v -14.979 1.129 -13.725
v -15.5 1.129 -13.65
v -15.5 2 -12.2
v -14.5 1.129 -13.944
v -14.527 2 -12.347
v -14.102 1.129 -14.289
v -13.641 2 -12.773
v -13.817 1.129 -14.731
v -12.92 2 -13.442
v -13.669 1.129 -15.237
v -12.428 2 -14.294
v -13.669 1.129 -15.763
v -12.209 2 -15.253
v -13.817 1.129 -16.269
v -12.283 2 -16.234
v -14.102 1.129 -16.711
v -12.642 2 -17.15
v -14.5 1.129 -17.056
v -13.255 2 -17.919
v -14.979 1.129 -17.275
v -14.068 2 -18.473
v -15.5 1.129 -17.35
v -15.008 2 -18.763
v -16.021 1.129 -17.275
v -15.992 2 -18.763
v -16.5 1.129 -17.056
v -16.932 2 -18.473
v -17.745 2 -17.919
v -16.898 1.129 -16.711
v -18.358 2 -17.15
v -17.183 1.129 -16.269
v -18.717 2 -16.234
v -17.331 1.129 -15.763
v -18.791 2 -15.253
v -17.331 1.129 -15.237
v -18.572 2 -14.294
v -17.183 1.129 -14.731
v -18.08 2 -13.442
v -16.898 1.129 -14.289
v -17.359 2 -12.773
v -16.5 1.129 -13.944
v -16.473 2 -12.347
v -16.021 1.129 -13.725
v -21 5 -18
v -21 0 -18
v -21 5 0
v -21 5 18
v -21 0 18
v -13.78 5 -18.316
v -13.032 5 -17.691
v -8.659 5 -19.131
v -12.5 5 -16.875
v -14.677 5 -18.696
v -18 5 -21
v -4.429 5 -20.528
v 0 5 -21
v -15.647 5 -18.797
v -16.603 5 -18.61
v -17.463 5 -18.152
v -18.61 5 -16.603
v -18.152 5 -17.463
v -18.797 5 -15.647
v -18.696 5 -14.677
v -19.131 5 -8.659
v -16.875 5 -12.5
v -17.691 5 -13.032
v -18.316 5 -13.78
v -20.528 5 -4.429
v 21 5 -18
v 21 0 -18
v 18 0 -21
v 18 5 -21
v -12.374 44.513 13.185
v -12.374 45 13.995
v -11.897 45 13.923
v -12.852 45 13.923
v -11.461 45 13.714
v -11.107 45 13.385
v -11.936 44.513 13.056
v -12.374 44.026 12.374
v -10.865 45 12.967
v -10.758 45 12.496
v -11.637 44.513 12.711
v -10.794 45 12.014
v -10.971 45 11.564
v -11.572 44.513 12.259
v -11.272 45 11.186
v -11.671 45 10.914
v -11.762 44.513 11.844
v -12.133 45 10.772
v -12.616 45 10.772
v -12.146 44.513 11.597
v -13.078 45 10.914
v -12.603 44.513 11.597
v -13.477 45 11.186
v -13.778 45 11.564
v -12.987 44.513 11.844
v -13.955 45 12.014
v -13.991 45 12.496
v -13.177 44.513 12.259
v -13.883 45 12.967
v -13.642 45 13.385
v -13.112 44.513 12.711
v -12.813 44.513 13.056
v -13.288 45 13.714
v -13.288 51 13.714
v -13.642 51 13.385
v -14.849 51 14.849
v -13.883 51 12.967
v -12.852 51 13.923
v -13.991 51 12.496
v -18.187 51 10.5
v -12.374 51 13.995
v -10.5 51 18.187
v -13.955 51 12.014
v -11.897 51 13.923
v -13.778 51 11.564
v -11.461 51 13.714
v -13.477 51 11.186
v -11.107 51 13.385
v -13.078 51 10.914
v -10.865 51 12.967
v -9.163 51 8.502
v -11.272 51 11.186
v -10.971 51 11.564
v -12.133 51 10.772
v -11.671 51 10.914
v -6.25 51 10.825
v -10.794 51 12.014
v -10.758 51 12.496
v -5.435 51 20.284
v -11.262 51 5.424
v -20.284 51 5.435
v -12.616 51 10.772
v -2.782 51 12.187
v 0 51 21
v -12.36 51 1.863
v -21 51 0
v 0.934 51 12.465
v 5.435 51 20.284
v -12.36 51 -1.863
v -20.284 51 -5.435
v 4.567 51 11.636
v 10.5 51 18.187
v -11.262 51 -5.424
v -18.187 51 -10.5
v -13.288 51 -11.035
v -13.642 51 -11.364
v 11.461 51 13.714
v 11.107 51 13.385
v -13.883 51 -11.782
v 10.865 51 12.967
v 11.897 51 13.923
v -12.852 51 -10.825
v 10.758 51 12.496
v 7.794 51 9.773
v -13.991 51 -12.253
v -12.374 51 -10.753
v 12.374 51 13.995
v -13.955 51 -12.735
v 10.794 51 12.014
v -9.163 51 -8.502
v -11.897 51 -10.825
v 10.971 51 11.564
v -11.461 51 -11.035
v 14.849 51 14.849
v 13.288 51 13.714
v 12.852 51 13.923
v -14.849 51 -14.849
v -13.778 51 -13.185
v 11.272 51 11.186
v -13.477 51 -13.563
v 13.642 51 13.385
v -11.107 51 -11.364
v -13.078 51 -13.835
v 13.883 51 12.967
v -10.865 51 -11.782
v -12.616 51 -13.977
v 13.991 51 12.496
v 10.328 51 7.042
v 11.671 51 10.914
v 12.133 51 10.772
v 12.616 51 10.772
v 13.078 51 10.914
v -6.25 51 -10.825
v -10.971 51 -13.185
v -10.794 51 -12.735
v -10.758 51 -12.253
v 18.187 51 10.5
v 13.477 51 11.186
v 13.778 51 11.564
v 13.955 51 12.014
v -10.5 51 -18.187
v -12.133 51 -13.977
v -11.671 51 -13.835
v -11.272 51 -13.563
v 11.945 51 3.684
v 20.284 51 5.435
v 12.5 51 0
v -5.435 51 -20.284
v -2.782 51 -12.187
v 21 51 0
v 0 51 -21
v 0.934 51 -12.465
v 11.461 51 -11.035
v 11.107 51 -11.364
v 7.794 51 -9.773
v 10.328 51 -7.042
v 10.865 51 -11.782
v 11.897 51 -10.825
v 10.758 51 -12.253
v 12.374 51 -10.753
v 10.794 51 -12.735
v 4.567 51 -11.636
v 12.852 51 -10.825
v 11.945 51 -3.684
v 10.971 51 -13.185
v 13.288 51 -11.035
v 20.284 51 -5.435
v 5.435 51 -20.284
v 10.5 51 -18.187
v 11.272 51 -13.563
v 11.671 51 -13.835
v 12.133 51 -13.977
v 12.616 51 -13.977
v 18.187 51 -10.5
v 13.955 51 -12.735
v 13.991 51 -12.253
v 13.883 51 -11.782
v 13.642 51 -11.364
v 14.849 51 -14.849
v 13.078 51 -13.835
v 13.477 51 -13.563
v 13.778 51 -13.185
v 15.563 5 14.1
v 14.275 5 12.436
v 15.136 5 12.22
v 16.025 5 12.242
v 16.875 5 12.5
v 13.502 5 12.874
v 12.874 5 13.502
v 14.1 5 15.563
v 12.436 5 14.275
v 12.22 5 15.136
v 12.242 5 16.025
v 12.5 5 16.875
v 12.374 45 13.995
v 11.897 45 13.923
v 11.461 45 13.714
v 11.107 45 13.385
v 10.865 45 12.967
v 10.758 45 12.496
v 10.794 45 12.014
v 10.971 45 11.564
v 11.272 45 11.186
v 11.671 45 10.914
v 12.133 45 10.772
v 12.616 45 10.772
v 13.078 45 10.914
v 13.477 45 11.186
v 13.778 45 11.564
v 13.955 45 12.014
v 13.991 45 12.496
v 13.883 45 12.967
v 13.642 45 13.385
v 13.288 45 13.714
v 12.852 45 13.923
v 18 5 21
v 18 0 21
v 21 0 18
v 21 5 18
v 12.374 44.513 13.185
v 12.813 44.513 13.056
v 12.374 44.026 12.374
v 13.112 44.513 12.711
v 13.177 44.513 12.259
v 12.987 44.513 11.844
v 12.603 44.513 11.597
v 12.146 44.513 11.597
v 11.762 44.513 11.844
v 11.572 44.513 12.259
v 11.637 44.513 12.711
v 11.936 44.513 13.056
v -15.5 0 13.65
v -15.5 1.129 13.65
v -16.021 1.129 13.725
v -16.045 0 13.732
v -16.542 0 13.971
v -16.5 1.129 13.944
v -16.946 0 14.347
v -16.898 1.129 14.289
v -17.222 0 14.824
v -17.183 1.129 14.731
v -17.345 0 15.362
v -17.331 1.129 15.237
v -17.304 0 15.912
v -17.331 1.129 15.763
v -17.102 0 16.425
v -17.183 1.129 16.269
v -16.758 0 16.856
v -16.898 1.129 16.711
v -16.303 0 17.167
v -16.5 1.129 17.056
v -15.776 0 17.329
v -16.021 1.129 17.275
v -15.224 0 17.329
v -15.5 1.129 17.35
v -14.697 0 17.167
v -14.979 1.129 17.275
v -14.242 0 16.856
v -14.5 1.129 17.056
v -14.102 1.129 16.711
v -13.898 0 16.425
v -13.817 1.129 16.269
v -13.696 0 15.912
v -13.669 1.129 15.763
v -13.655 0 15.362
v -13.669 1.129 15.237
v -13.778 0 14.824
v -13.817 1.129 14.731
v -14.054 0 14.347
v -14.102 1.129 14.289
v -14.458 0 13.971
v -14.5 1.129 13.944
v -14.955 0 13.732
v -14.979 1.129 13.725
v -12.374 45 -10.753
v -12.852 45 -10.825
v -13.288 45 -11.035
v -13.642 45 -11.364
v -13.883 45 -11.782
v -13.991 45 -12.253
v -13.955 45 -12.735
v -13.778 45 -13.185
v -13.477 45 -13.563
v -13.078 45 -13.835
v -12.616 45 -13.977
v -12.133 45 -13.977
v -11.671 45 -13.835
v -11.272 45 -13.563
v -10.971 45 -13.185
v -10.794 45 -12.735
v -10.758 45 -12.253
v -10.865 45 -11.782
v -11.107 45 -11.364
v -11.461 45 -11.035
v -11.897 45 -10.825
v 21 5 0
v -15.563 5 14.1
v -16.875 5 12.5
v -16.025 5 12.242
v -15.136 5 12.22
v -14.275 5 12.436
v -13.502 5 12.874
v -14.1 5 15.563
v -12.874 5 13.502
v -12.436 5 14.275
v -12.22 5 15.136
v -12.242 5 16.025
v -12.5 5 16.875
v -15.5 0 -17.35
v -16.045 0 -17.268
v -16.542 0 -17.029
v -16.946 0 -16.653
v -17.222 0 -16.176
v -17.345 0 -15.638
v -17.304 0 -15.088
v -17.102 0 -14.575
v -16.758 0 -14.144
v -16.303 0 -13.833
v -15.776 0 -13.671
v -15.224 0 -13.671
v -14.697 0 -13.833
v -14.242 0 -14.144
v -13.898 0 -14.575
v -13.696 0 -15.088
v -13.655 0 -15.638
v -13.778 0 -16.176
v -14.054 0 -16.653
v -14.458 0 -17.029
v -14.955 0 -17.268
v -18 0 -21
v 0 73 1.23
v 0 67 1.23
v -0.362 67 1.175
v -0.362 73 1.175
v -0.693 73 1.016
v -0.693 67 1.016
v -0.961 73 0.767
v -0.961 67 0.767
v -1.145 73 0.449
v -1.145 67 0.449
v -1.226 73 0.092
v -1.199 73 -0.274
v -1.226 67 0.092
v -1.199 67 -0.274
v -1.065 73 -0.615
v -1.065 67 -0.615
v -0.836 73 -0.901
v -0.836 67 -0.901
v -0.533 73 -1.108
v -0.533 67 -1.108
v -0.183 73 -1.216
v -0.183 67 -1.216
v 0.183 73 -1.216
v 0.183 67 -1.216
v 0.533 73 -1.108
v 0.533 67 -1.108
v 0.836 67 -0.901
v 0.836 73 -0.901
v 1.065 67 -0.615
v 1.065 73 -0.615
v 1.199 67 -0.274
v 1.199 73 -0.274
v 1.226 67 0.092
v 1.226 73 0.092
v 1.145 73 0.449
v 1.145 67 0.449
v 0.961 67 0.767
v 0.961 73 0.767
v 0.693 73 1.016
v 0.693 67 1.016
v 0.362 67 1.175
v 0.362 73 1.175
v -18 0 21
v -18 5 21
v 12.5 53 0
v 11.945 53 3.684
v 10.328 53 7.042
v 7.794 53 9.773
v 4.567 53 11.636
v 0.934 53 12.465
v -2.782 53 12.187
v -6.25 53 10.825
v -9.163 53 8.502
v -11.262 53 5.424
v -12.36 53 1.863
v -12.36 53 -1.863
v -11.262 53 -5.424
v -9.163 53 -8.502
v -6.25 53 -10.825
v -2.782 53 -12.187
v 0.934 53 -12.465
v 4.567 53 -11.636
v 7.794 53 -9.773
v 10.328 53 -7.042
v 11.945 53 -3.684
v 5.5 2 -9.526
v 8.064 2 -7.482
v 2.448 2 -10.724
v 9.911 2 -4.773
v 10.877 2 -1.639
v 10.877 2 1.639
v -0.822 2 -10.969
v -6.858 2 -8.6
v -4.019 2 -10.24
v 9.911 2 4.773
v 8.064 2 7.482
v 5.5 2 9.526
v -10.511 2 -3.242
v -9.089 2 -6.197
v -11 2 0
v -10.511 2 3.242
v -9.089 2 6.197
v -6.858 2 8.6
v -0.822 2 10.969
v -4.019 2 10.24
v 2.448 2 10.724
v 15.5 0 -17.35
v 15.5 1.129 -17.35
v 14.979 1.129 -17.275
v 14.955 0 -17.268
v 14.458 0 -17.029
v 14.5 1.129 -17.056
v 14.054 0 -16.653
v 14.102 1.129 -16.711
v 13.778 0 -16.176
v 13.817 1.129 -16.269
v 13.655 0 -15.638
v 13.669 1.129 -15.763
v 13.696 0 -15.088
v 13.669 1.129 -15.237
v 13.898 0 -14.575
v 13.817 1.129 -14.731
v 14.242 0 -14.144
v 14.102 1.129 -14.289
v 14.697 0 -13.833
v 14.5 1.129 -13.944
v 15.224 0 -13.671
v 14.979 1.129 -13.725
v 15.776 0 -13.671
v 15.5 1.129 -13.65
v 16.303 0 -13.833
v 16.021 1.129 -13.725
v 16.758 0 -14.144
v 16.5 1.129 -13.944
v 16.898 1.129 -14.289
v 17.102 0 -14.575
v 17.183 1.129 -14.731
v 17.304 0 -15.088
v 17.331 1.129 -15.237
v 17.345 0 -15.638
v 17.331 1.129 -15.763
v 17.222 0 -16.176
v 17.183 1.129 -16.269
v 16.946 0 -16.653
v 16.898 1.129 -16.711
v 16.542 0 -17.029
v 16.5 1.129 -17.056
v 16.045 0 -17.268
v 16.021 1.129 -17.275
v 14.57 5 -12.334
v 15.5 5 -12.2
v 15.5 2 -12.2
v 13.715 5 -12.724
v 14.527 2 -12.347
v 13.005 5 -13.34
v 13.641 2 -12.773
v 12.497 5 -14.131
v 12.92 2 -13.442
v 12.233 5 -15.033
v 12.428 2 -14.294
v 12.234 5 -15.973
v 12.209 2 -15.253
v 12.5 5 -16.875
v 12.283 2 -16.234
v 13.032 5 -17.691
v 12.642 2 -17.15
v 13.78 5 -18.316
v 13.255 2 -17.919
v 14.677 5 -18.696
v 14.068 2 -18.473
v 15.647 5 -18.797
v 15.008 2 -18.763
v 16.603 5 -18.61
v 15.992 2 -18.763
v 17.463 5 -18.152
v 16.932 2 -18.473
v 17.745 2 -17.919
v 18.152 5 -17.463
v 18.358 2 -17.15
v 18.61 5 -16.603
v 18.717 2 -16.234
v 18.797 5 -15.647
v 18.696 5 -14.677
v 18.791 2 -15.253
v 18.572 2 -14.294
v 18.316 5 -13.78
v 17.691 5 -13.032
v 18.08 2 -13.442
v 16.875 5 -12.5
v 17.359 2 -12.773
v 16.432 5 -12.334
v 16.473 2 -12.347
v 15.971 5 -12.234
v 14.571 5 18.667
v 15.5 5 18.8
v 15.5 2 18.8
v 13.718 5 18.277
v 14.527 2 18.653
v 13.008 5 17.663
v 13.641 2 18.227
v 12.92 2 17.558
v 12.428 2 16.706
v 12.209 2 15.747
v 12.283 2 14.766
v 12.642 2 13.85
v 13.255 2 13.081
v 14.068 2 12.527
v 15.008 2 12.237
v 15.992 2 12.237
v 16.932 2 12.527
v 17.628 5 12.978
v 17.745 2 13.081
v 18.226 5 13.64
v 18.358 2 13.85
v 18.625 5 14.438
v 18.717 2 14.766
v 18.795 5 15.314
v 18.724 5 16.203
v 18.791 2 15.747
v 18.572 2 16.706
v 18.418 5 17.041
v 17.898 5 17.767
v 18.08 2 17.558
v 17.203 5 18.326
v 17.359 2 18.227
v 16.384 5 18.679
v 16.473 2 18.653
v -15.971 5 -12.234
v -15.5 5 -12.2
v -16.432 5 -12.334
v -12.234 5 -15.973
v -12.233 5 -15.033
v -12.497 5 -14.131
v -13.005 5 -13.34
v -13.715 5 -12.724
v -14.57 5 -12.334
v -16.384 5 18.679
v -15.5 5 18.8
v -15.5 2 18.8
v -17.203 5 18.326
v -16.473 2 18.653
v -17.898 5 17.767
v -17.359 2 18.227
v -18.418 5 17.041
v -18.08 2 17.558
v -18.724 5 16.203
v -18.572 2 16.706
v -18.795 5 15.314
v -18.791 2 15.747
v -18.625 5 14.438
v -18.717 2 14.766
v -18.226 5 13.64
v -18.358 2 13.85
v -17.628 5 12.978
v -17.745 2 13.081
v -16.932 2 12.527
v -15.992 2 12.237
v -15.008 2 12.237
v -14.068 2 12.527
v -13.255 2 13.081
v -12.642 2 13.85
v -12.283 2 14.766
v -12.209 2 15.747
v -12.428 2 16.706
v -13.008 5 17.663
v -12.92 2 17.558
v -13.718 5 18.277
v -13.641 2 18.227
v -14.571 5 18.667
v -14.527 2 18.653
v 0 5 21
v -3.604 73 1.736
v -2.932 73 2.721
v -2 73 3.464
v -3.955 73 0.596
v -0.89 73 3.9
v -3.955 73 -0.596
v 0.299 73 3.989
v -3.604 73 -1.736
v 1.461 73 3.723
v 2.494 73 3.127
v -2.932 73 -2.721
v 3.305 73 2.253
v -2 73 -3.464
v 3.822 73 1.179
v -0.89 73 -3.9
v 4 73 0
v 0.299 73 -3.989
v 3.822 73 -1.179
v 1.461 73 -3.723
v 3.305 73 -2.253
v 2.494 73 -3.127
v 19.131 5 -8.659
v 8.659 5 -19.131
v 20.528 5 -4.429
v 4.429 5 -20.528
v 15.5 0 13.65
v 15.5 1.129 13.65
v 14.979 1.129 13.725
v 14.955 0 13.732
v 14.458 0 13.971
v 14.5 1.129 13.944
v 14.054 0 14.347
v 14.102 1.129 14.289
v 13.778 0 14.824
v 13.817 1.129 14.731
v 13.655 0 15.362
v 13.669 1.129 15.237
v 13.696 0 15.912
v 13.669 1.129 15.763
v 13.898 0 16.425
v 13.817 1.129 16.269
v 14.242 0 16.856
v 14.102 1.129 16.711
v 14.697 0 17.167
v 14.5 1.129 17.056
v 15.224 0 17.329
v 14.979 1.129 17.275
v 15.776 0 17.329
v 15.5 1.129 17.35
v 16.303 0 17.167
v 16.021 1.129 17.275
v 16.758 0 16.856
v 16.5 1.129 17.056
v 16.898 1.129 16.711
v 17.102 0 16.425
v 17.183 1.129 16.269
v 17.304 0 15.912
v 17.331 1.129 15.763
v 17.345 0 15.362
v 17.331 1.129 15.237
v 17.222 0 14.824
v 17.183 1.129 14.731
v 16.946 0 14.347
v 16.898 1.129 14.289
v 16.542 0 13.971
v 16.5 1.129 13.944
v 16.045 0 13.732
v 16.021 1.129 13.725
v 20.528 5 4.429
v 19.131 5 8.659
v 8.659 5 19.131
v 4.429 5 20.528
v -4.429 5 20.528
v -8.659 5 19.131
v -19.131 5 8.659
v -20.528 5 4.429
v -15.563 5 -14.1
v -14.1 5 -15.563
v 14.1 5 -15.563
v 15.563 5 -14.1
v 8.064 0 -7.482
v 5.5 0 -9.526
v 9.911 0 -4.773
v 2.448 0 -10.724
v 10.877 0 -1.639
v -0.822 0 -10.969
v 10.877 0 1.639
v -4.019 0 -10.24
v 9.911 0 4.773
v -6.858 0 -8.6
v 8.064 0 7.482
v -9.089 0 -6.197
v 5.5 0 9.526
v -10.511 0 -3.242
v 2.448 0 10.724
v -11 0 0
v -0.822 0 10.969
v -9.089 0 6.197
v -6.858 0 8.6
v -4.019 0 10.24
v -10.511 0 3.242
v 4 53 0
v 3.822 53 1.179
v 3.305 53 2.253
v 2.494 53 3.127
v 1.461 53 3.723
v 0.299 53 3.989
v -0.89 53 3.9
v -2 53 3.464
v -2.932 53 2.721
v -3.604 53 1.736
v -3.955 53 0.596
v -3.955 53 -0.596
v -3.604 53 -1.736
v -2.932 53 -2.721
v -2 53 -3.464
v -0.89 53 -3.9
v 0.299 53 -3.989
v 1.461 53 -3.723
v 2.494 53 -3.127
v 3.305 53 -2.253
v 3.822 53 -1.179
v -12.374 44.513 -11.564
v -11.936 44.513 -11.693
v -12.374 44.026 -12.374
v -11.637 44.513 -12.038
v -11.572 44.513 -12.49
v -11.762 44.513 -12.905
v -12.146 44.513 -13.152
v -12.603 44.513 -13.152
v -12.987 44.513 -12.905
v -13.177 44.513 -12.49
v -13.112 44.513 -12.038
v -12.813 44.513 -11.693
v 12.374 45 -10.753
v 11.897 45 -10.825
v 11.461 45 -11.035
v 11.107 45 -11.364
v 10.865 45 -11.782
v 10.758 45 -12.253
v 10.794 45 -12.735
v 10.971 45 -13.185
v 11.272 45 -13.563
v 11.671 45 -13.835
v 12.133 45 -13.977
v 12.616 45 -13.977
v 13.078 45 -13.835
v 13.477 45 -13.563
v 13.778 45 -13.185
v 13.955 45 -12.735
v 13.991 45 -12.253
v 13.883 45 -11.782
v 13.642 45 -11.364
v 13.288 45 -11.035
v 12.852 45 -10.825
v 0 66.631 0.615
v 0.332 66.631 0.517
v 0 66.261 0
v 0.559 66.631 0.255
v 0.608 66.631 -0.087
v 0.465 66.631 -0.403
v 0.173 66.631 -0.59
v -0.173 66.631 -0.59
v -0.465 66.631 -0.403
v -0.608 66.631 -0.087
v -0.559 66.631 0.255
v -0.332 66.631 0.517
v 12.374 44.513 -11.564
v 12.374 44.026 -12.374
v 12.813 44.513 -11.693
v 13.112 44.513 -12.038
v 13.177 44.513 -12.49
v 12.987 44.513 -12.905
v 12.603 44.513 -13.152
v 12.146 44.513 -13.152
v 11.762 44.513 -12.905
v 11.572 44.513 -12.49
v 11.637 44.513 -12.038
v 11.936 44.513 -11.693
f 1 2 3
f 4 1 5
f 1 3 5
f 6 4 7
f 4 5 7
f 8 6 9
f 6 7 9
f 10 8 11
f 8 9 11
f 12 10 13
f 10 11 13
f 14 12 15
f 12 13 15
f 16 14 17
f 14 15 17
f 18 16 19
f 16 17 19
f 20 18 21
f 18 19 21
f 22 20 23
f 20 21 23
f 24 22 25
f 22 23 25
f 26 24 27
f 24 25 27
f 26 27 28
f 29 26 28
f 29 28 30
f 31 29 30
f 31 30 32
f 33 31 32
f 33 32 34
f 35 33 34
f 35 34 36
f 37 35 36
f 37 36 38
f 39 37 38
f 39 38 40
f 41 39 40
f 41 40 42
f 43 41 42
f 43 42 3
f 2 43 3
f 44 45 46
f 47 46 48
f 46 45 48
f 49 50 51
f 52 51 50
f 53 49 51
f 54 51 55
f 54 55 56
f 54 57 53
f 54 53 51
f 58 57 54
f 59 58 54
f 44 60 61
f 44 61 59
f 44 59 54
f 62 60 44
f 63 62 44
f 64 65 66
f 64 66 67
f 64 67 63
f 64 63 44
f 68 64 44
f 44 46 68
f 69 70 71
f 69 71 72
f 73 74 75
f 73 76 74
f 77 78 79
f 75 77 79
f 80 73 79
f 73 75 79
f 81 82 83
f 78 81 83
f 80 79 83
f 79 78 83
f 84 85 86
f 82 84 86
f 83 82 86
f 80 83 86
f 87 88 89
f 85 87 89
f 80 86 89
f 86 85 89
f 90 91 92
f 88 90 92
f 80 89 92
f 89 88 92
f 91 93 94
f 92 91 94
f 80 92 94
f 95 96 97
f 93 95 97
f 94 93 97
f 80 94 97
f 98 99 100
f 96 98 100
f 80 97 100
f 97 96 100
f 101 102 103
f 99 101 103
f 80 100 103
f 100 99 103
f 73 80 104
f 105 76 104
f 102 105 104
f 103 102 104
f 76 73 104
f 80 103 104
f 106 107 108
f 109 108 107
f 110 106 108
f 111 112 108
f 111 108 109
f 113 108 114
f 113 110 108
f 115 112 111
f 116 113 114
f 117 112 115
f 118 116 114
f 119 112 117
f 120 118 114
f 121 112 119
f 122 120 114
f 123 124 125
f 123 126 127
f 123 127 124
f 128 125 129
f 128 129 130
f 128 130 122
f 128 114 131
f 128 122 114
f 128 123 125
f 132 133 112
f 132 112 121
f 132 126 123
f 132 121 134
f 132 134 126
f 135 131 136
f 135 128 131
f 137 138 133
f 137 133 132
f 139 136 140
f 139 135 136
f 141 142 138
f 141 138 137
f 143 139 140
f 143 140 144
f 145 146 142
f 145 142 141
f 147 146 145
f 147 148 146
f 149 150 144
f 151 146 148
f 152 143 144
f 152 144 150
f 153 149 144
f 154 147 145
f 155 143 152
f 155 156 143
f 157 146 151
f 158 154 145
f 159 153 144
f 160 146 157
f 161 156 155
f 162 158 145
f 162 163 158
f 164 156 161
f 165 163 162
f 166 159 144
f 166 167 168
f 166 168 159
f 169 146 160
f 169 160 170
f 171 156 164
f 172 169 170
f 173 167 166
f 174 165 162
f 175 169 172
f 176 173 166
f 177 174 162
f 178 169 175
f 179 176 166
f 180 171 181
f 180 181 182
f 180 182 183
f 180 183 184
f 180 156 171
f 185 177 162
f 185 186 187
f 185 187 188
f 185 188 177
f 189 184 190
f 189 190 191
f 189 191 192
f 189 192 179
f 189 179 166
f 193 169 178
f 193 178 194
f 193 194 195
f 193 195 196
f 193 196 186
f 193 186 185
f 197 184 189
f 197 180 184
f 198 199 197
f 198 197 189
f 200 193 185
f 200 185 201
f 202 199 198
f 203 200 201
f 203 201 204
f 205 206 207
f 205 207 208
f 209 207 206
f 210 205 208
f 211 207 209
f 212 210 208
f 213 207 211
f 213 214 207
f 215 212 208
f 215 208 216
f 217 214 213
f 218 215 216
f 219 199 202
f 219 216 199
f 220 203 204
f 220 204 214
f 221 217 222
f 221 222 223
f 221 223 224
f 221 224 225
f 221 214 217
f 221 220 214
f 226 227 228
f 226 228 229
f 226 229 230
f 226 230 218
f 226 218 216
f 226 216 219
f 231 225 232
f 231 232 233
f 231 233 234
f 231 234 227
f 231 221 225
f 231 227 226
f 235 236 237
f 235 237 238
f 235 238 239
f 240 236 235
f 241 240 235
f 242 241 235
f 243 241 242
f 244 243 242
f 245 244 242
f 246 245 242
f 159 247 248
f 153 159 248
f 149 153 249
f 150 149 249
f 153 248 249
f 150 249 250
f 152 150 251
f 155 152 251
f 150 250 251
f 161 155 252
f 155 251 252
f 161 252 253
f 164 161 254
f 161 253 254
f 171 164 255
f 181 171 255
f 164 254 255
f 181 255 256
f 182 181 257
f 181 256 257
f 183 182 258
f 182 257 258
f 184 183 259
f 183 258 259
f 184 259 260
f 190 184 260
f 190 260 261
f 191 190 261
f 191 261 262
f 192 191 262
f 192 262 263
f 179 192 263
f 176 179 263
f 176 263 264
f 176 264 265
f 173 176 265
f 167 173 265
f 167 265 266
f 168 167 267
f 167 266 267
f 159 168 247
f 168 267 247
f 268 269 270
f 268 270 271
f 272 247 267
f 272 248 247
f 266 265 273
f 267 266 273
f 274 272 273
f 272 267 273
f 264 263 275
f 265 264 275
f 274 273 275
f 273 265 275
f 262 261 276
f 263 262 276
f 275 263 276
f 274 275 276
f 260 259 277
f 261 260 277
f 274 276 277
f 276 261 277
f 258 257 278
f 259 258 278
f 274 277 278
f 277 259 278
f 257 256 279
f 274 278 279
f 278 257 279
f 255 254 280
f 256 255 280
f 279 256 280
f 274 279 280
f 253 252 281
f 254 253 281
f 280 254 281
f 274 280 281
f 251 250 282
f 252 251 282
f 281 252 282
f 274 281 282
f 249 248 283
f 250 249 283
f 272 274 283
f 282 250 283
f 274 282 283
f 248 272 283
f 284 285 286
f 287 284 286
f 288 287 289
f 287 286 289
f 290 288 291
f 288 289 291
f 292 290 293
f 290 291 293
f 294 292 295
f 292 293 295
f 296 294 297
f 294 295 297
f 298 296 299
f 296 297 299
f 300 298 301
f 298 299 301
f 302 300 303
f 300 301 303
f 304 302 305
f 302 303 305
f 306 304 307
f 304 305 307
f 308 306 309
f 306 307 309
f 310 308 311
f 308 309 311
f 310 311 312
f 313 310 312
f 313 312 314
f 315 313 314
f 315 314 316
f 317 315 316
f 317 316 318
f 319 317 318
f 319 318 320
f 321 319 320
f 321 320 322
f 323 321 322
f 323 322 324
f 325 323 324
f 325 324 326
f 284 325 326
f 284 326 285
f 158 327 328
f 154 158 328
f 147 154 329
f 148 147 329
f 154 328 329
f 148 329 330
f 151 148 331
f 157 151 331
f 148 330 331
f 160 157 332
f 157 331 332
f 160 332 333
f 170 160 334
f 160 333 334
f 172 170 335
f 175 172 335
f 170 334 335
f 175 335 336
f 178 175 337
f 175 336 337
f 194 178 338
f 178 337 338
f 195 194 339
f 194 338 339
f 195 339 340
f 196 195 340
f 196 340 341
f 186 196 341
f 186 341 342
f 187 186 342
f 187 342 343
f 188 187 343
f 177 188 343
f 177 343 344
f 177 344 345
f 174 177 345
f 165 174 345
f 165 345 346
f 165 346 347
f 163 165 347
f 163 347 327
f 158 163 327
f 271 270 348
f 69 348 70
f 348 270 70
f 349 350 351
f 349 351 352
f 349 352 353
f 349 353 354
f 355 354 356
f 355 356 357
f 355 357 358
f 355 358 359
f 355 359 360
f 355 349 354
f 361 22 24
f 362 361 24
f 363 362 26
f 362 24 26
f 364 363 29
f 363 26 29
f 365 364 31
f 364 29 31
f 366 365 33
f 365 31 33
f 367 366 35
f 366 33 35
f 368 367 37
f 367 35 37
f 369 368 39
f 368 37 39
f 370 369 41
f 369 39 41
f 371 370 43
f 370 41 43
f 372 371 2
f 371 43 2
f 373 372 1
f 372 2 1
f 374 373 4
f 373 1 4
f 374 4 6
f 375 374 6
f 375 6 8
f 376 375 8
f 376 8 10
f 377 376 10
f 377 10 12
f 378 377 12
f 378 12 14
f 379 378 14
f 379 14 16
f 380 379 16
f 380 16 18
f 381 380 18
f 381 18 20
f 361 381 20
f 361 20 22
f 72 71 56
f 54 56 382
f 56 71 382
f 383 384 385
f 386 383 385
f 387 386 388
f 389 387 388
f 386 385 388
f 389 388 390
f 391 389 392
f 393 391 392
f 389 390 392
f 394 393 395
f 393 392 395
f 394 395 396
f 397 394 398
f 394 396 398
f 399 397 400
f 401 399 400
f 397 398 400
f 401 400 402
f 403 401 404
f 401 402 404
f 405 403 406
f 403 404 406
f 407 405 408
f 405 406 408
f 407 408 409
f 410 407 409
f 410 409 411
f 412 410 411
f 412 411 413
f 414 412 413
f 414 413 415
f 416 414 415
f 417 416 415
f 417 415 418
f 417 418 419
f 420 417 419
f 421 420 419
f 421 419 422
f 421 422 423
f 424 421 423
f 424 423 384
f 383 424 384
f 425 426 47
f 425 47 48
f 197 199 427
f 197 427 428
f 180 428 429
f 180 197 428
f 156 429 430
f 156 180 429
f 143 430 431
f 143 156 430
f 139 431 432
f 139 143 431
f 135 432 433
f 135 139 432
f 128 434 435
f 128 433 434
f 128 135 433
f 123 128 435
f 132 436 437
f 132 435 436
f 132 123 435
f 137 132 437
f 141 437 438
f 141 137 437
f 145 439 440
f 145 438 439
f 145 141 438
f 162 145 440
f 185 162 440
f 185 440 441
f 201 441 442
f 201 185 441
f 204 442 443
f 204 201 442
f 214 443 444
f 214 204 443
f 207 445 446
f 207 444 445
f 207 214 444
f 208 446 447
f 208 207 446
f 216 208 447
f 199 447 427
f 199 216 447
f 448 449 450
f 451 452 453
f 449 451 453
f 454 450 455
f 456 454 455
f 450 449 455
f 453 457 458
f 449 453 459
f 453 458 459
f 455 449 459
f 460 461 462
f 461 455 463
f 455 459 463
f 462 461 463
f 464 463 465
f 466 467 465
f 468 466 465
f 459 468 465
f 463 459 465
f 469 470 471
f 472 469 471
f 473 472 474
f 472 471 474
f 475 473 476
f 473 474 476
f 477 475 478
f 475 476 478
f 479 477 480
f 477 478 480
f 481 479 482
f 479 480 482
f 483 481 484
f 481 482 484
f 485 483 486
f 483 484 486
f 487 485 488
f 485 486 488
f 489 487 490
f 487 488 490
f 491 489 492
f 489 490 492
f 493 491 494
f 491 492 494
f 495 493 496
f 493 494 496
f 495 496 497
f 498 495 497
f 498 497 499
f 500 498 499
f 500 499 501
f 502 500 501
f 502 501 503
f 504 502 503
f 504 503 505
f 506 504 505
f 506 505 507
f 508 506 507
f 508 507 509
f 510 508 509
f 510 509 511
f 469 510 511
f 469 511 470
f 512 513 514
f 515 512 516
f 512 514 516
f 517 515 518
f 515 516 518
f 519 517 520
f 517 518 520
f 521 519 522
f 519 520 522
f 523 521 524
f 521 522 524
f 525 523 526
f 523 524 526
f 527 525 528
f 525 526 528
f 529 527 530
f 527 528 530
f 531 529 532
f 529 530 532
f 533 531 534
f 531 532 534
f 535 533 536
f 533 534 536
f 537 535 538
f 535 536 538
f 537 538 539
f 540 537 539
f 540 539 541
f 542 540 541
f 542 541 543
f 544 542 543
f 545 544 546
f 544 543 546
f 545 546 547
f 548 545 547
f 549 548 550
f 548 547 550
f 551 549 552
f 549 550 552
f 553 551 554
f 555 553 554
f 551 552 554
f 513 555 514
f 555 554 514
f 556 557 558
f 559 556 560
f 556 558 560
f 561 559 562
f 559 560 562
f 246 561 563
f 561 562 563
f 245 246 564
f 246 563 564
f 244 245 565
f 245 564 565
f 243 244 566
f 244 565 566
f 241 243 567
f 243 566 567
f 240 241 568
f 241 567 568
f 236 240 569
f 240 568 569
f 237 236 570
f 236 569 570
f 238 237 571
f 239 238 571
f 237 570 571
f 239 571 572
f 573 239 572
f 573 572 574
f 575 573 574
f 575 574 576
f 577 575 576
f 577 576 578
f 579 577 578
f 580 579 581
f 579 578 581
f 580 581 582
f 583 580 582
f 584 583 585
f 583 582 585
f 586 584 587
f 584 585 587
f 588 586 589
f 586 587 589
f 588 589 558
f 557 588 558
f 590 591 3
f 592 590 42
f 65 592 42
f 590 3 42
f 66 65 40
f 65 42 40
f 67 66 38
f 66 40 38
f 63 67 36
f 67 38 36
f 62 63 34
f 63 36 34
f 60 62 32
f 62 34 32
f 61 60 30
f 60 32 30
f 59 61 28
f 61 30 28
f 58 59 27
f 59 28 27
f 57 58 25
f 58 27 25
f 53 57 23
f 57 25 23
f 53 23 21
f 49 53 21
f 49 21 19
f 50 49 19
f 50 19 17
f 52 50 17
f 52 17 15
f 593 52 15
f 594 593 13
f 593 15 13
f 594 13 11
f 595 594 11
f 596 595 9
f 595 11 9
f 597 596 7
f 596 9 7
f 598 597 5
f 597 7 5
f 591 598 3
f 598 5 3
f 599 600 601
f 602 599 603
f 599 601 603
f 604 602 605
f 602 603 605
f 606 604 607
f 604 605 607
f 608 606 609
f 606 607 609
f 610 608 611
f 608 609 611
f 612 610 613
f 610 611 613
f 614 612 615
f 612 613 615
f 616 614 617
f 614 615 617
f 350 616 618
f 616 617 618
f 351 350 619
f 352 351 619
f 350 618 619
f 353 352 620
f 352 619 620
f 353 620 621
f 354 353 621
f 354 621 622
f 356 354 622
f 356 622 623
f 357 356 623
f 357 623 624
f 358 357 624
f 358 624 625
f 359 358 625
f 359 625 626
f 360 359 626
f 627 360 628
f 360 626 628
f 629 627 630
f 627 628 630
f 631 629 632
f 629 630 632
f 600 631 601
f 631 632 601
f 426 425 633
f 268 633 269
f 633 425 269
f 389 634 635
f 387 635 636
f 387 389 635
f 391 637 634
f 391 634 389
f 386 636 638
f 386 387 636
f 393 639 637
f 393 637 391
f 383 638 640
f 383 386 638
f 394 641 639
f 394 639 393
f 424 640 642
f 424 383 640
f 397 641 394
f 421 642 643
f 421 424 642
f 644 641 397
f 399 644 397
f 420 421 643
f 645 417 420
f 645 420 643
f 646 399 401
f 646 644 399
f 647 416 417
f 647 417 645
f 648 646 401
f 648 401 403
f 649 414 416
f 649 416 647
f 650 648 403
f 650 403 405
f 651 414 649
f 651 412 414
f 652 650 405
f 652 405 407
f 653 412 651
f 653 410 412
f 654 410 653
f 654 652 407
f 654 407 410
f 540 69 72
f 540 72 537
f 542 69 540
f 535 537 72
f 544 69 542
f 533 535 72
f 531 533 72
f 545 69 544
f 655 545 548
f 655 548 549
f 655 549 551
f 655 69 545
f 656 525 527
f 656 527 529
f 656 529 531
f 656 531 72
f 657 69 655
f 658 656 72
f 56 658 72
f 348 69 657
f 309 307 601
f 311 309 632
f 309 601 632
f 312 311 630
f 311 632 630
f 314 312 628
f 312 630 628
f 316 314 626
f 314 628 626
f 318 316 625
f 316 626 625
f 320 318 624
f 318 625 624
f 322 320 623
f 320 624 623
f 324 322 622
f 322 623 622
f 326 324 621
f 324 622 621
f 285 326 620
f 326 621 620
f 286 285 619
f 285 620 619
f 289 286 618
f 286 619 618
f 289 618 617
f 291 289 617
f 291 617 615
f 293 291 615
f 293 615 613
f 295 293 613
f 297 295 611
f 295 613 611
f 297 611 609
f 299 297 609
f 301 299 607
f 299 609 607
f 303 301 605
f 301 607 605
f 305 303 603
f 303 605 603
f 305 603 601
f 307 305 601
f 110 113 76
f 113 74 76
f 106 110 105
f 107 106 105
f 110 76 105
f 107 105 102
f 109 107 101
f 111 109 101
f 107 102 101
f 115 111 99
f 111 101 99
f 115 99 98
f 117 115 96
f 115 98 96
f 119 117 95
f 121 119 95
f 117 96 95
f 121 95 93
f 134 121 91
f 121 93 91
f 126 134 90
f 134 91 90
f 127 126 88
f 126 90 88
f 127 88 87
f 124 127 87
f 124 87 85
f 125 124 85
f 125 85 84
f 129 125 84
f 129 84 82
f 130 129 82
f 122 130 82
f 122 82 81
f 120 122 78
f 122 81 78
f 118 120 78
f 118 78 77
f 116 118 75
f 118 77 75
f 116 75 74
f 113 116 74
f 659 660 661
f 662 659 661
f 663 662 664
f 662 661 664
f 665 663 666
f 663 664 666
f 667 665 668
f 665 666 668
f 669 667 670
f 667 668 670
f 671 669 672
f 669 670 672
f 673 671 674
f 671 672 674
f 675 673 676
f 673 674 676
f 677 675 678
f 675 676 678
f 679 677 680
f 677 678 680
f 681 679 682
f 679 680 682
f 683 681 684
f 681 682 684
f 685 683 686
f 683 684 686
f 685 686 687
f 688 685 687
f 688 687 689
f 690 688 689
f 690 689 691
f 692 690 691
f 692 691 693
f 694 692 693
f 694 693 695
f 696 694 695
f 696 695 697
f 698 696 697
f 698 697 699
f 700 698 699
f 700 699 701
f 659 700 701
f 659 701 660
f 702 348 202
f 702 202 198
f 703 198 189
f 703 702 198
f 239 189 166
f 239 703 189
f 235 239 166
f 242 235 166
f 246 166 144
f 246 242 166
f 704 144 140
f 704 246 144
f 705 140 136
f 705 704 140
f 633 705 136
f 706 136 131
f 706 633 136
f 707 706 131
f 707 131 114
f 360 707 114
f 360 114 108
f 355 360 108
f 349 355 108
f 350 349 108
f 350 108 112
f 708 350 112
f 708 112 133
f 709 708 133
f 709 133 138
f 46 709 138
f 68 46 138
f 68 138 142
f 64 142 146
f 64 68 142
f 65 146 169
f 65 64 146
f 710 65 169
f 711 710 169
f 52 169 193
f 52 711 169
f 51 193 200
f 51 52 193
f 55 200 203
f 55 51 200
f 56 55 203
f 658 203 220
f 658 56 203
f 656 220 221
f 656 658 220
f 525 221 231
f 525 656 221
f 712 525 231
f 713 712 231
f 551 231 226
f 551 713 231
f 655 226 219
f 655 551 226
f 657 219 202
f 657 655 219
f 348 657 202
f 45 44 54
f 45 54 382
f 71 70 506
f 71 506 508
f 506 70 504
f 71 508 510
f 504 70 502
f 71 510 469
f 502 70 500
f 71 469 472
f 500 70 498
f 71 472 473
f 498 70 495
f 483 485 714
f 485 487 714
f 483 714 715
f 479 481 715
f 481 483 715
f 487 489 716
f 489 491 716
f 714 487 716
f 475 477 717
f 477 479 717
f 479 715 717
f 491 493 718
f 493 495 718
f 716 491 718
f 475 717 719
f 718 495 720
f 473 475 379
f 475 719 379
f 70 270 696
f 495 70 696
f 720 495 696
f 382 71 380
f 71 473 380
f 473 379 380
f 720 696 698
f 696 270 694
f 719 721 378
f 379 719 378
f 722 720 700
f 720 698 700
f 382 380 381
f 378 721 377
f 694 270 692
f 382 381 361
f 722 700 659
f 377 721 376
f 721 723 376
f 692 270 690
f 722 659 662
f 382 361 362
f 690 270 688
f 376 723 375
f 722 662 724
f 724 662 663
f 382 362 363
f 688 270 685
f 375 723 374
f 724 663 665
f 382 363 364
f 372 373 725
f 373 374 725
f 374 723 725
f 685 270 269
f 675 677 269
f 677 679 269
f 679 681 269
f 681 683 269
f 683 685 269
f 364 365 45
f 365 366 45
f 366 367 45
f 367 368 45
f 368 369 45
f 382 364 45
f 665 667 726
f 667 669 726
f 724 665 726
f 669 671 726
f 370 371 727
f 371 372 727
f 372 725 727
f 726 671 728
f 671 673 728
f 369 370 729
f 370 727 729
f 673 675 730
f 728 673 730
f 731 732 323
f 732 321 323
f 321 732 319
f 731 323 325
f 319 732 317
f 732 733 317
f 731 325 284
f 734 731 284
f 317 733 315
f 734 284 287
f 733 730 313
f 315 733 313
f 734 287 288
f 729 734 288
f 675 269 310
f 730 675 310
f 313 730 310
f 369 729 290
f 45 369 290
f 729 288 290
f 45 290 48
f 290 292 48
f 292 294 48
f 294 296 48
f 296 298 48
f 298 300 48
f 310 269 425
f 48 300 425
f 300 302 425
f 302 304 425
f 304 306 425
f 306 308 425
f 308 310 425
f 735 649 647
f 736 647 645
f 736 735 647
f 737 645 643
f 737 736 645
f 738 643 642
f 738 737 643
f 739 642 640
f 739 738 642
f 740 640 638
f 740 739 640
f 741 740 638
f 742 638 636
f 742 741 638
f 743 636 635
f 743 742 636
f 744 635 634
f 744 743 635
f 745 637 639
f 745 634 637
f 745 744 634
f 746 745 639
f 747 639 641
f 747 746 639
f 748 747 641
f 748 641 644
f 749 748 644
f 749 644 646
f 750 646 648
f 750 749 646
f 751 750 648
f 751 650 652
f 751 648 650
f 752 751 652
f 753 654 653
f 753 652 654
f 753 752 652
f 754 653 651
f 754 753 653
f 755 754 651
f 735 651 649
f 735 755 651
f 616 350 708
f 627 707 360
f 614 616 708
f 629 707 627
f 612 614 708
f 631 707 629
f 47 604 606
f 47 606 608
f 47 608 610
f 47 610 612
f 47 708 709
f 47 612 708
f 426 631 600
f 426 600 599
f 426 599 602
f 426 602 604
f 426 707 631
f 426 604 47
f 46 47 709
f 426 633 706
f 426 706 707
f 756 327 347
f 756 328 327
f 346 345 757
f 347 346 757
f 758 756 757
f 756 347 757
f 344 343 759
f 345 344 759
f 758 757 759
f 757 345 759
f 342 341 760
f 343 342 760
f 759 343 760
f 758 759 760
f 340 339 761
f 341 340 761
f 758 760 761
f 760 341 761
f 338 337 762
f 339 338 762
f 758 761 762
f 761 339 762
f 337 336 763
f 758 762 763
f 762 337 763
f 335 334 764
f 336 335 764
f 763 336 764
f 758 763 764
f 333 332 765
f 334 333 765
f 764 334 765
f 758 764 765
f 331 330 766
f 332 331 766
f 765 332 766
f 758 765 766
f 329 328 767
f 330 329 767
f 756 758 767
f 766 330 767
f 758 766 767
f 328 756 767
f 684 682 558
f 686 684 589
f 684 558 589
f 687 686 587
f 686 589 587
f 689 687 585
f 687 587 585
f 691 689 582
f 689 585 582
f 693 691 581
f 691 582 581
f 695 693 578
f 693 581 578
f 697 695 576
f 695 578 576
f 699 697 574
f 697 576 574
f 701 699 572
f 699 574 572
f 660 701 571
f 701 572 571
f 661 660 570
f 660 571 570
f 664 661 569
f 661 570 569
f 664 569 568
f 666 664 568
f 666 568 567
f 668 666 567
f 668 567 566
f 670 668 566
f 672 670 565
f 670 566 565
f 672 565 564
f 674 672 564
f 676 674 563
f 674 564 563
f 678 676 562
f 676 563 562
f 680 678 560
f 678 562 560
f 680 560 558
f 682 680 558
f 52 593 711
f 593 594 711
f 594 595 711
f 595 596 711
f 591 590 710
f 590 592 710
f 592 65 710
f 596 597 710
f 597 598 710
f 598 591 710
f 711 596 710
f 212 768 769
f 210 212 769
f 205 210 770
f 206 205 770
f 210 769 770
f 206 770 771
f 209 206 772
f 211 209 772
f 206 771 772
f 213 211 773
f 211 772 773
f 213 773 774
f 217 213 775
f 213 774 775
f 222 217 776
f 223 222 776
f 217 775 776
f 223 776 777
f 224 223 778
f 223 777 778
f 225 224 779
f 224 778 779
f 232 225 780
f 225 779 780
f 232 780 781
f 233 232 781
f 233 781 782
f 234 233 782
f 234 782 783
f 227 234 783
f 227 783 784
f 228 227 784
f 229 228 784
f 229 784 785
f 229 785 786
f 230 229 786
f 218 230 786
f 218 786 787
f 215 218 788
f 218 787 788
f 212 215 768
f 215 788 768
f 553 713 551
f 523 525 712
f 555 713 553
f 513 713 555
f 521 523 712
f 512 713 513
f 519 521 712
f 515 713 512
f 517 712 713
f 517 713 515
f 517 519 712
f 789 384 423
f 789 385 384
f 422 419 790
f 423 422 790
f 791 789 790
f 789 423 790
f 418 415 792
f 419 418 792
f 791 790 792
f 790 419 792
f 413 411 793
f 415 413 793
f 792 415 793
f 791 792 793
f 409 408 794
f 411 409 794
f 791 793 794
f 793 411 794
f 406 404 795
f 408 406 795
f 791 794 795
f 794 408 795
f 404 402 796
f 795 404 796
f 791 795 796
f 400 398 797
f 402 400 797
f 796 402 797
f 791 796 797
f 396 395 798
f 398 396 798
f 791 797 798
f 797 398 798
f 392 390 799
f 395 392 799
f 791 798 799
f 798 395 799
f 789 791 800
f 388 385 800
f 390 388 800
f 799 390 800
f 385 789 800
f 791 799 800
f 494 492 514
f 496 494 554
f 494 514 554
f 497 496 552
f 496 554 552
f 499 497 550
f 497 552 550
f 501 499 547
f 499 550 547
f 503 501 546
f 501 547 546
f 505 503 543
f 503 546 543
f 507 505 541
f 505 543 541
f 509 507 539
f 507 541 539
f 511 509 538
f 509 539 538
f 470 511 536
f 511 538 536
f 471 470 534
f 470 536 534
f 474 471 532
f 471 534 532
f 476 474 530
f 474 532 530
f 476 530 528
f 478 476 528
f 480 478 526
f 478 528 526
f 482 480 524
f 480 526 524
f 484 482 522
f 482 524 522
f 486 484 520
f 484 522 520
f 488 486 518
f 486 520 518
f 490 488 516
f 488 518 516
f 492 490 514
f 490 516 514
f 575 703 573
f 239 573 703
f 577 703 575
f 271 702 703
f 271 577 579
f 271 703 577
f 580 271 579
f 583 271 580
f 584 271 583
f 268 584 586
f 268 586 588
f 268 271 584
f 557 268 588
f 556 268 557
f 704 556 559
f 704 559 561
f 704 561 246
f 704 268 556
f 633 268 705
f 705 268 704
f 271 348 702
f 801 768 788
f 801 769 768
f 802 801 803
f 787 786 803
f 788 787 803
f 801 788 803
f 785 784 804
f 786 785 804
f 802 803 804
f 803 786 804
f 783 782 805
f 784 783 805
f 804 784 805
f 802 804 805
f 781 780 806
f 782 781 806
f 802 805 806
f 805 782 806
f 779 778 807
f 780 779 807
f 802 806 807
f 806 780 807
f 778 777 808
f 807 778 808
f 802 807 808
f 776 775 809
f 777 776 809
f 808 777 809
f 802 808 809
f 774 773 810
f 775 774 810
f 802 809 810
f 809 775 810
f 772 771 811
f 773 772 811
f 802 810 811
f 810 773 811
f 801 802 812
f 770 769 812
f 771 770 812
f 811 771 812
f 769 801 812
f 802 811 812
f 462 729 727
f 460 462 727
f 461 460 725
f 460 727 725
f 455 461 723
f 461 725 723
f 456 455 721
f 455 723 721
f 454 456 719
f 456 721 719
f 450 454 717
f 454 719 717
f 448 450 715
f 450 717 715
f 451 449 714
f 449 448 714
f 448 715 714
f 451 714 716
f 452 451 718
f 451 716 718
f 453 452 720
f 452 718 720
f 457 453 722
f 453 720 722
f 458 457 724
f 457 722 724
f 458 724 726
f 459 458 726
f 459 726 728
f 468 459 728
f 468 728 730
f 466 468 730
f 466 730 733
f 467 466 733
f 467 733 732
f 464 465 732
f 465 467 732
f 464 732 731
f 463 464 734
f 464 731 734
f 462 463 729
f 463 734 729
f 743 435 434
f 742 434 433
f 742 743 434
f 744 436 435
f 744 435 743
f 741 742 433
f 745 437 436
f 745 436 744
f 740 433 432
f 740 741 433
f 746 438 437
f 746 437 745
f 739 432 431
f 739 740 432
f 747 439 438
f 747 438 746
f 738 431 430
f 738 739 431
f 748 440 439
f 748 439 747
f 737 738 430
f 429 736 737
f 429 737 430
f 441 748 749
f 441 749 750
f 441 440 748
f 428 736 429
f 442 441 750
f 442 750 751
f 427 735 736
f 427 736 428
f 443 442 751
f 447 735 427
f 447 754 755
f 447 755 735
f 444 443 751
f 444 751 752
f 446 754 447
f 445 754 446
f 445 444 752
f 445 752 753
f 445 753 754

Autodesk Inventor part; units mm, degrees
ref_plane "YZ Plane" through (0, 0, 0) normal (1, 0, 0) x (0, 1, 0)
ref_plane "XZ Plane" through (0, 0, 0) normal (0, 1, 0) x (-1, 0, 0)
ref_plane "XY Plane" through (0, 0, 0) normal (0, 0, 1) x (1, 0, 0)
sketch "Sketch1" plane through (0, 0, 0) normal (0, 1, 0) x (-1, 0, 0)
  line L0 (-21, -21) -> (21, -21)
  line L1 (21, -21) -> (21, 21)
  line L2 (21, 21) -> (-21, 21)
  line L3 (-21, 21) -> (-21, -21)
  line L4 (-21, -21) -> (21, 21) construction
  line L5 (21, -21) -> (-21, 21) construction
  point P0 (0, 0)
  dimension "d0" = 42
extrude "Extrusion1" add sketch "Sketch1" along normal blind 5
sketch "Sketch2" plane through (0, 0, 0) normal (0, 1, 0) x (1, 0, 0)
  circle A0 centre (0, 0) radius 21
  dimension "d3" = 42
extrude "Extrusion2" add sketch "Sketch2" along normal blind 51
sketch "Sketch3" plane through (0, 51, 0) normal (0, 1, 0) x (1, 0, 0)
  circle A0 centre (0, 0) radius 12.5
  dimension "d6" = 25
extrude "Extrusion3" add sketch "Sketch3" along normal blind 2
sketch "Sketch4" plane through (0, 51, 0) normal (0, 1, 0) x (1, 0, 0)
  circle A0 centre (0, 0) radius 4
  dimension "d9" = 8
extrude "Extrusion4" add sketch "Sketch4" along normal blind 22
sketch "Sketch5" plane through (0, 51, 0) normal (0, 1, 0) x (1, 0, 0)
  line L0 (-12.3744, -12.3744) -> (12.3744, -12.3744)
  line L1 (12.3744, -12.3744) -> (12.3744, 12.3744)
  line L2 (12.3744, 12.3744) -> (-12.3744, 12.3744)
  line L3 (-12.3744, 12.3744) -> (-12.3744, -12.3744)
  line L4 (-12.3744, -12.3744) -> (12.3744, 12.3744) construction
  line L5 (12.3744, -12.3744) -> (-12.3744, 12.3744) construction
  point P0 (0, 0)
  dimension "d15" = 35
hole "Hole1" at (12.3744, 51, -12.3744) at (-12.3744, 51, -12.3744) at (-12.3744, 51, 12.3744) at (12.3744, 51, 12.3744) direction (0, -1, 0) diameter 3.242 depth 6 tip angle 118 thread size "M4x0.7" class "6H" standard "ISO Metric profile"
sketch "Sketch6" plane through (0, 73, 0) normal (0, 1, 0) x (1, 0, 0)
  point P0 (0, 0)
  point P1 (0, 0)
hole "Hole2" at (0, 73, 0) direction (0, -1, 0) diameter 2.459 depth 6 tip angle 118 thread size "M3x0.5" class "6H" standard "ISO Metric profile"
chamfer "Chamfer1" distance 3 angle 45 4 edges at (21, 2.5, -21) (-21, 2.5, -21) (21, 2.5, 21) (-21, 2.5, 21)
sketch "Sketch7" plane through (0, 0, 0) normal (0, 1, 0) x (-1, 0, 0)
  circle A0 centre (0, 0) radius 11
  dimension "d30" = 22
extrude "Extrusion5" cut sketch "Sketch7" along normal blind 2
sketch "Sketch8" plane through (0, 0, 0) normal (0, 1, 0) x (-1, 0, 0)
  line L0 (15.5, 15.5) -> (-15.5, 15.5)
  line L1 (-15.5, 15.5) -> (-15.5, -15.5)
  line L2 (-15.5, -15.5) -> (15.5, -15.5)
  line L3 (15.5, -15.5) -> (15.5, 15.5)
  line L4 (15.5, 15.5) -> (-15.5, -15.5) construction
  line L5 (-15.5, 15.5) -> (15.5, -15.5) construction
  point P0 (0, 0)
  dimension "d33" = 31
hole "Hole3" at (15.5, 0, 15.5) at (-15.5, 0, 15.5) at (-15.5, 0, -15.5) at (15.5, 0, -15.5) direction (0, 1, 0) diameter 3.7 depth 5
sketch "Sketch9" plane through (0, 5, 0) normal (0, 1, 0) x (1, 0, 0)
  arc A0 (-15.9176, -13.6978) -> (-13.6978, -15.9176) centre (-15.5, -15.5) ccw projected
  circle A1 centre (-15.5, 15.5) radius 1.85 projected
  arc A2 (15.9176, 13.6978) -> (13.6978, 15.9176) centre (15.5, 15.5) ccw projected
  circle A3 centre (15.5, -15.5) radius 1.85 projected
  point P0 (0, 0)
hole "Hole4" at (-15.5, 5, 15.5) at (-15.5, 5, -15.5) at (15.5, 5, -15.5) at (15.5, 5, 15.5) direction (0, -1, 0) diameter 6.6 depth 3 tip angle 118
properties part number "911-42-reducer-long"
